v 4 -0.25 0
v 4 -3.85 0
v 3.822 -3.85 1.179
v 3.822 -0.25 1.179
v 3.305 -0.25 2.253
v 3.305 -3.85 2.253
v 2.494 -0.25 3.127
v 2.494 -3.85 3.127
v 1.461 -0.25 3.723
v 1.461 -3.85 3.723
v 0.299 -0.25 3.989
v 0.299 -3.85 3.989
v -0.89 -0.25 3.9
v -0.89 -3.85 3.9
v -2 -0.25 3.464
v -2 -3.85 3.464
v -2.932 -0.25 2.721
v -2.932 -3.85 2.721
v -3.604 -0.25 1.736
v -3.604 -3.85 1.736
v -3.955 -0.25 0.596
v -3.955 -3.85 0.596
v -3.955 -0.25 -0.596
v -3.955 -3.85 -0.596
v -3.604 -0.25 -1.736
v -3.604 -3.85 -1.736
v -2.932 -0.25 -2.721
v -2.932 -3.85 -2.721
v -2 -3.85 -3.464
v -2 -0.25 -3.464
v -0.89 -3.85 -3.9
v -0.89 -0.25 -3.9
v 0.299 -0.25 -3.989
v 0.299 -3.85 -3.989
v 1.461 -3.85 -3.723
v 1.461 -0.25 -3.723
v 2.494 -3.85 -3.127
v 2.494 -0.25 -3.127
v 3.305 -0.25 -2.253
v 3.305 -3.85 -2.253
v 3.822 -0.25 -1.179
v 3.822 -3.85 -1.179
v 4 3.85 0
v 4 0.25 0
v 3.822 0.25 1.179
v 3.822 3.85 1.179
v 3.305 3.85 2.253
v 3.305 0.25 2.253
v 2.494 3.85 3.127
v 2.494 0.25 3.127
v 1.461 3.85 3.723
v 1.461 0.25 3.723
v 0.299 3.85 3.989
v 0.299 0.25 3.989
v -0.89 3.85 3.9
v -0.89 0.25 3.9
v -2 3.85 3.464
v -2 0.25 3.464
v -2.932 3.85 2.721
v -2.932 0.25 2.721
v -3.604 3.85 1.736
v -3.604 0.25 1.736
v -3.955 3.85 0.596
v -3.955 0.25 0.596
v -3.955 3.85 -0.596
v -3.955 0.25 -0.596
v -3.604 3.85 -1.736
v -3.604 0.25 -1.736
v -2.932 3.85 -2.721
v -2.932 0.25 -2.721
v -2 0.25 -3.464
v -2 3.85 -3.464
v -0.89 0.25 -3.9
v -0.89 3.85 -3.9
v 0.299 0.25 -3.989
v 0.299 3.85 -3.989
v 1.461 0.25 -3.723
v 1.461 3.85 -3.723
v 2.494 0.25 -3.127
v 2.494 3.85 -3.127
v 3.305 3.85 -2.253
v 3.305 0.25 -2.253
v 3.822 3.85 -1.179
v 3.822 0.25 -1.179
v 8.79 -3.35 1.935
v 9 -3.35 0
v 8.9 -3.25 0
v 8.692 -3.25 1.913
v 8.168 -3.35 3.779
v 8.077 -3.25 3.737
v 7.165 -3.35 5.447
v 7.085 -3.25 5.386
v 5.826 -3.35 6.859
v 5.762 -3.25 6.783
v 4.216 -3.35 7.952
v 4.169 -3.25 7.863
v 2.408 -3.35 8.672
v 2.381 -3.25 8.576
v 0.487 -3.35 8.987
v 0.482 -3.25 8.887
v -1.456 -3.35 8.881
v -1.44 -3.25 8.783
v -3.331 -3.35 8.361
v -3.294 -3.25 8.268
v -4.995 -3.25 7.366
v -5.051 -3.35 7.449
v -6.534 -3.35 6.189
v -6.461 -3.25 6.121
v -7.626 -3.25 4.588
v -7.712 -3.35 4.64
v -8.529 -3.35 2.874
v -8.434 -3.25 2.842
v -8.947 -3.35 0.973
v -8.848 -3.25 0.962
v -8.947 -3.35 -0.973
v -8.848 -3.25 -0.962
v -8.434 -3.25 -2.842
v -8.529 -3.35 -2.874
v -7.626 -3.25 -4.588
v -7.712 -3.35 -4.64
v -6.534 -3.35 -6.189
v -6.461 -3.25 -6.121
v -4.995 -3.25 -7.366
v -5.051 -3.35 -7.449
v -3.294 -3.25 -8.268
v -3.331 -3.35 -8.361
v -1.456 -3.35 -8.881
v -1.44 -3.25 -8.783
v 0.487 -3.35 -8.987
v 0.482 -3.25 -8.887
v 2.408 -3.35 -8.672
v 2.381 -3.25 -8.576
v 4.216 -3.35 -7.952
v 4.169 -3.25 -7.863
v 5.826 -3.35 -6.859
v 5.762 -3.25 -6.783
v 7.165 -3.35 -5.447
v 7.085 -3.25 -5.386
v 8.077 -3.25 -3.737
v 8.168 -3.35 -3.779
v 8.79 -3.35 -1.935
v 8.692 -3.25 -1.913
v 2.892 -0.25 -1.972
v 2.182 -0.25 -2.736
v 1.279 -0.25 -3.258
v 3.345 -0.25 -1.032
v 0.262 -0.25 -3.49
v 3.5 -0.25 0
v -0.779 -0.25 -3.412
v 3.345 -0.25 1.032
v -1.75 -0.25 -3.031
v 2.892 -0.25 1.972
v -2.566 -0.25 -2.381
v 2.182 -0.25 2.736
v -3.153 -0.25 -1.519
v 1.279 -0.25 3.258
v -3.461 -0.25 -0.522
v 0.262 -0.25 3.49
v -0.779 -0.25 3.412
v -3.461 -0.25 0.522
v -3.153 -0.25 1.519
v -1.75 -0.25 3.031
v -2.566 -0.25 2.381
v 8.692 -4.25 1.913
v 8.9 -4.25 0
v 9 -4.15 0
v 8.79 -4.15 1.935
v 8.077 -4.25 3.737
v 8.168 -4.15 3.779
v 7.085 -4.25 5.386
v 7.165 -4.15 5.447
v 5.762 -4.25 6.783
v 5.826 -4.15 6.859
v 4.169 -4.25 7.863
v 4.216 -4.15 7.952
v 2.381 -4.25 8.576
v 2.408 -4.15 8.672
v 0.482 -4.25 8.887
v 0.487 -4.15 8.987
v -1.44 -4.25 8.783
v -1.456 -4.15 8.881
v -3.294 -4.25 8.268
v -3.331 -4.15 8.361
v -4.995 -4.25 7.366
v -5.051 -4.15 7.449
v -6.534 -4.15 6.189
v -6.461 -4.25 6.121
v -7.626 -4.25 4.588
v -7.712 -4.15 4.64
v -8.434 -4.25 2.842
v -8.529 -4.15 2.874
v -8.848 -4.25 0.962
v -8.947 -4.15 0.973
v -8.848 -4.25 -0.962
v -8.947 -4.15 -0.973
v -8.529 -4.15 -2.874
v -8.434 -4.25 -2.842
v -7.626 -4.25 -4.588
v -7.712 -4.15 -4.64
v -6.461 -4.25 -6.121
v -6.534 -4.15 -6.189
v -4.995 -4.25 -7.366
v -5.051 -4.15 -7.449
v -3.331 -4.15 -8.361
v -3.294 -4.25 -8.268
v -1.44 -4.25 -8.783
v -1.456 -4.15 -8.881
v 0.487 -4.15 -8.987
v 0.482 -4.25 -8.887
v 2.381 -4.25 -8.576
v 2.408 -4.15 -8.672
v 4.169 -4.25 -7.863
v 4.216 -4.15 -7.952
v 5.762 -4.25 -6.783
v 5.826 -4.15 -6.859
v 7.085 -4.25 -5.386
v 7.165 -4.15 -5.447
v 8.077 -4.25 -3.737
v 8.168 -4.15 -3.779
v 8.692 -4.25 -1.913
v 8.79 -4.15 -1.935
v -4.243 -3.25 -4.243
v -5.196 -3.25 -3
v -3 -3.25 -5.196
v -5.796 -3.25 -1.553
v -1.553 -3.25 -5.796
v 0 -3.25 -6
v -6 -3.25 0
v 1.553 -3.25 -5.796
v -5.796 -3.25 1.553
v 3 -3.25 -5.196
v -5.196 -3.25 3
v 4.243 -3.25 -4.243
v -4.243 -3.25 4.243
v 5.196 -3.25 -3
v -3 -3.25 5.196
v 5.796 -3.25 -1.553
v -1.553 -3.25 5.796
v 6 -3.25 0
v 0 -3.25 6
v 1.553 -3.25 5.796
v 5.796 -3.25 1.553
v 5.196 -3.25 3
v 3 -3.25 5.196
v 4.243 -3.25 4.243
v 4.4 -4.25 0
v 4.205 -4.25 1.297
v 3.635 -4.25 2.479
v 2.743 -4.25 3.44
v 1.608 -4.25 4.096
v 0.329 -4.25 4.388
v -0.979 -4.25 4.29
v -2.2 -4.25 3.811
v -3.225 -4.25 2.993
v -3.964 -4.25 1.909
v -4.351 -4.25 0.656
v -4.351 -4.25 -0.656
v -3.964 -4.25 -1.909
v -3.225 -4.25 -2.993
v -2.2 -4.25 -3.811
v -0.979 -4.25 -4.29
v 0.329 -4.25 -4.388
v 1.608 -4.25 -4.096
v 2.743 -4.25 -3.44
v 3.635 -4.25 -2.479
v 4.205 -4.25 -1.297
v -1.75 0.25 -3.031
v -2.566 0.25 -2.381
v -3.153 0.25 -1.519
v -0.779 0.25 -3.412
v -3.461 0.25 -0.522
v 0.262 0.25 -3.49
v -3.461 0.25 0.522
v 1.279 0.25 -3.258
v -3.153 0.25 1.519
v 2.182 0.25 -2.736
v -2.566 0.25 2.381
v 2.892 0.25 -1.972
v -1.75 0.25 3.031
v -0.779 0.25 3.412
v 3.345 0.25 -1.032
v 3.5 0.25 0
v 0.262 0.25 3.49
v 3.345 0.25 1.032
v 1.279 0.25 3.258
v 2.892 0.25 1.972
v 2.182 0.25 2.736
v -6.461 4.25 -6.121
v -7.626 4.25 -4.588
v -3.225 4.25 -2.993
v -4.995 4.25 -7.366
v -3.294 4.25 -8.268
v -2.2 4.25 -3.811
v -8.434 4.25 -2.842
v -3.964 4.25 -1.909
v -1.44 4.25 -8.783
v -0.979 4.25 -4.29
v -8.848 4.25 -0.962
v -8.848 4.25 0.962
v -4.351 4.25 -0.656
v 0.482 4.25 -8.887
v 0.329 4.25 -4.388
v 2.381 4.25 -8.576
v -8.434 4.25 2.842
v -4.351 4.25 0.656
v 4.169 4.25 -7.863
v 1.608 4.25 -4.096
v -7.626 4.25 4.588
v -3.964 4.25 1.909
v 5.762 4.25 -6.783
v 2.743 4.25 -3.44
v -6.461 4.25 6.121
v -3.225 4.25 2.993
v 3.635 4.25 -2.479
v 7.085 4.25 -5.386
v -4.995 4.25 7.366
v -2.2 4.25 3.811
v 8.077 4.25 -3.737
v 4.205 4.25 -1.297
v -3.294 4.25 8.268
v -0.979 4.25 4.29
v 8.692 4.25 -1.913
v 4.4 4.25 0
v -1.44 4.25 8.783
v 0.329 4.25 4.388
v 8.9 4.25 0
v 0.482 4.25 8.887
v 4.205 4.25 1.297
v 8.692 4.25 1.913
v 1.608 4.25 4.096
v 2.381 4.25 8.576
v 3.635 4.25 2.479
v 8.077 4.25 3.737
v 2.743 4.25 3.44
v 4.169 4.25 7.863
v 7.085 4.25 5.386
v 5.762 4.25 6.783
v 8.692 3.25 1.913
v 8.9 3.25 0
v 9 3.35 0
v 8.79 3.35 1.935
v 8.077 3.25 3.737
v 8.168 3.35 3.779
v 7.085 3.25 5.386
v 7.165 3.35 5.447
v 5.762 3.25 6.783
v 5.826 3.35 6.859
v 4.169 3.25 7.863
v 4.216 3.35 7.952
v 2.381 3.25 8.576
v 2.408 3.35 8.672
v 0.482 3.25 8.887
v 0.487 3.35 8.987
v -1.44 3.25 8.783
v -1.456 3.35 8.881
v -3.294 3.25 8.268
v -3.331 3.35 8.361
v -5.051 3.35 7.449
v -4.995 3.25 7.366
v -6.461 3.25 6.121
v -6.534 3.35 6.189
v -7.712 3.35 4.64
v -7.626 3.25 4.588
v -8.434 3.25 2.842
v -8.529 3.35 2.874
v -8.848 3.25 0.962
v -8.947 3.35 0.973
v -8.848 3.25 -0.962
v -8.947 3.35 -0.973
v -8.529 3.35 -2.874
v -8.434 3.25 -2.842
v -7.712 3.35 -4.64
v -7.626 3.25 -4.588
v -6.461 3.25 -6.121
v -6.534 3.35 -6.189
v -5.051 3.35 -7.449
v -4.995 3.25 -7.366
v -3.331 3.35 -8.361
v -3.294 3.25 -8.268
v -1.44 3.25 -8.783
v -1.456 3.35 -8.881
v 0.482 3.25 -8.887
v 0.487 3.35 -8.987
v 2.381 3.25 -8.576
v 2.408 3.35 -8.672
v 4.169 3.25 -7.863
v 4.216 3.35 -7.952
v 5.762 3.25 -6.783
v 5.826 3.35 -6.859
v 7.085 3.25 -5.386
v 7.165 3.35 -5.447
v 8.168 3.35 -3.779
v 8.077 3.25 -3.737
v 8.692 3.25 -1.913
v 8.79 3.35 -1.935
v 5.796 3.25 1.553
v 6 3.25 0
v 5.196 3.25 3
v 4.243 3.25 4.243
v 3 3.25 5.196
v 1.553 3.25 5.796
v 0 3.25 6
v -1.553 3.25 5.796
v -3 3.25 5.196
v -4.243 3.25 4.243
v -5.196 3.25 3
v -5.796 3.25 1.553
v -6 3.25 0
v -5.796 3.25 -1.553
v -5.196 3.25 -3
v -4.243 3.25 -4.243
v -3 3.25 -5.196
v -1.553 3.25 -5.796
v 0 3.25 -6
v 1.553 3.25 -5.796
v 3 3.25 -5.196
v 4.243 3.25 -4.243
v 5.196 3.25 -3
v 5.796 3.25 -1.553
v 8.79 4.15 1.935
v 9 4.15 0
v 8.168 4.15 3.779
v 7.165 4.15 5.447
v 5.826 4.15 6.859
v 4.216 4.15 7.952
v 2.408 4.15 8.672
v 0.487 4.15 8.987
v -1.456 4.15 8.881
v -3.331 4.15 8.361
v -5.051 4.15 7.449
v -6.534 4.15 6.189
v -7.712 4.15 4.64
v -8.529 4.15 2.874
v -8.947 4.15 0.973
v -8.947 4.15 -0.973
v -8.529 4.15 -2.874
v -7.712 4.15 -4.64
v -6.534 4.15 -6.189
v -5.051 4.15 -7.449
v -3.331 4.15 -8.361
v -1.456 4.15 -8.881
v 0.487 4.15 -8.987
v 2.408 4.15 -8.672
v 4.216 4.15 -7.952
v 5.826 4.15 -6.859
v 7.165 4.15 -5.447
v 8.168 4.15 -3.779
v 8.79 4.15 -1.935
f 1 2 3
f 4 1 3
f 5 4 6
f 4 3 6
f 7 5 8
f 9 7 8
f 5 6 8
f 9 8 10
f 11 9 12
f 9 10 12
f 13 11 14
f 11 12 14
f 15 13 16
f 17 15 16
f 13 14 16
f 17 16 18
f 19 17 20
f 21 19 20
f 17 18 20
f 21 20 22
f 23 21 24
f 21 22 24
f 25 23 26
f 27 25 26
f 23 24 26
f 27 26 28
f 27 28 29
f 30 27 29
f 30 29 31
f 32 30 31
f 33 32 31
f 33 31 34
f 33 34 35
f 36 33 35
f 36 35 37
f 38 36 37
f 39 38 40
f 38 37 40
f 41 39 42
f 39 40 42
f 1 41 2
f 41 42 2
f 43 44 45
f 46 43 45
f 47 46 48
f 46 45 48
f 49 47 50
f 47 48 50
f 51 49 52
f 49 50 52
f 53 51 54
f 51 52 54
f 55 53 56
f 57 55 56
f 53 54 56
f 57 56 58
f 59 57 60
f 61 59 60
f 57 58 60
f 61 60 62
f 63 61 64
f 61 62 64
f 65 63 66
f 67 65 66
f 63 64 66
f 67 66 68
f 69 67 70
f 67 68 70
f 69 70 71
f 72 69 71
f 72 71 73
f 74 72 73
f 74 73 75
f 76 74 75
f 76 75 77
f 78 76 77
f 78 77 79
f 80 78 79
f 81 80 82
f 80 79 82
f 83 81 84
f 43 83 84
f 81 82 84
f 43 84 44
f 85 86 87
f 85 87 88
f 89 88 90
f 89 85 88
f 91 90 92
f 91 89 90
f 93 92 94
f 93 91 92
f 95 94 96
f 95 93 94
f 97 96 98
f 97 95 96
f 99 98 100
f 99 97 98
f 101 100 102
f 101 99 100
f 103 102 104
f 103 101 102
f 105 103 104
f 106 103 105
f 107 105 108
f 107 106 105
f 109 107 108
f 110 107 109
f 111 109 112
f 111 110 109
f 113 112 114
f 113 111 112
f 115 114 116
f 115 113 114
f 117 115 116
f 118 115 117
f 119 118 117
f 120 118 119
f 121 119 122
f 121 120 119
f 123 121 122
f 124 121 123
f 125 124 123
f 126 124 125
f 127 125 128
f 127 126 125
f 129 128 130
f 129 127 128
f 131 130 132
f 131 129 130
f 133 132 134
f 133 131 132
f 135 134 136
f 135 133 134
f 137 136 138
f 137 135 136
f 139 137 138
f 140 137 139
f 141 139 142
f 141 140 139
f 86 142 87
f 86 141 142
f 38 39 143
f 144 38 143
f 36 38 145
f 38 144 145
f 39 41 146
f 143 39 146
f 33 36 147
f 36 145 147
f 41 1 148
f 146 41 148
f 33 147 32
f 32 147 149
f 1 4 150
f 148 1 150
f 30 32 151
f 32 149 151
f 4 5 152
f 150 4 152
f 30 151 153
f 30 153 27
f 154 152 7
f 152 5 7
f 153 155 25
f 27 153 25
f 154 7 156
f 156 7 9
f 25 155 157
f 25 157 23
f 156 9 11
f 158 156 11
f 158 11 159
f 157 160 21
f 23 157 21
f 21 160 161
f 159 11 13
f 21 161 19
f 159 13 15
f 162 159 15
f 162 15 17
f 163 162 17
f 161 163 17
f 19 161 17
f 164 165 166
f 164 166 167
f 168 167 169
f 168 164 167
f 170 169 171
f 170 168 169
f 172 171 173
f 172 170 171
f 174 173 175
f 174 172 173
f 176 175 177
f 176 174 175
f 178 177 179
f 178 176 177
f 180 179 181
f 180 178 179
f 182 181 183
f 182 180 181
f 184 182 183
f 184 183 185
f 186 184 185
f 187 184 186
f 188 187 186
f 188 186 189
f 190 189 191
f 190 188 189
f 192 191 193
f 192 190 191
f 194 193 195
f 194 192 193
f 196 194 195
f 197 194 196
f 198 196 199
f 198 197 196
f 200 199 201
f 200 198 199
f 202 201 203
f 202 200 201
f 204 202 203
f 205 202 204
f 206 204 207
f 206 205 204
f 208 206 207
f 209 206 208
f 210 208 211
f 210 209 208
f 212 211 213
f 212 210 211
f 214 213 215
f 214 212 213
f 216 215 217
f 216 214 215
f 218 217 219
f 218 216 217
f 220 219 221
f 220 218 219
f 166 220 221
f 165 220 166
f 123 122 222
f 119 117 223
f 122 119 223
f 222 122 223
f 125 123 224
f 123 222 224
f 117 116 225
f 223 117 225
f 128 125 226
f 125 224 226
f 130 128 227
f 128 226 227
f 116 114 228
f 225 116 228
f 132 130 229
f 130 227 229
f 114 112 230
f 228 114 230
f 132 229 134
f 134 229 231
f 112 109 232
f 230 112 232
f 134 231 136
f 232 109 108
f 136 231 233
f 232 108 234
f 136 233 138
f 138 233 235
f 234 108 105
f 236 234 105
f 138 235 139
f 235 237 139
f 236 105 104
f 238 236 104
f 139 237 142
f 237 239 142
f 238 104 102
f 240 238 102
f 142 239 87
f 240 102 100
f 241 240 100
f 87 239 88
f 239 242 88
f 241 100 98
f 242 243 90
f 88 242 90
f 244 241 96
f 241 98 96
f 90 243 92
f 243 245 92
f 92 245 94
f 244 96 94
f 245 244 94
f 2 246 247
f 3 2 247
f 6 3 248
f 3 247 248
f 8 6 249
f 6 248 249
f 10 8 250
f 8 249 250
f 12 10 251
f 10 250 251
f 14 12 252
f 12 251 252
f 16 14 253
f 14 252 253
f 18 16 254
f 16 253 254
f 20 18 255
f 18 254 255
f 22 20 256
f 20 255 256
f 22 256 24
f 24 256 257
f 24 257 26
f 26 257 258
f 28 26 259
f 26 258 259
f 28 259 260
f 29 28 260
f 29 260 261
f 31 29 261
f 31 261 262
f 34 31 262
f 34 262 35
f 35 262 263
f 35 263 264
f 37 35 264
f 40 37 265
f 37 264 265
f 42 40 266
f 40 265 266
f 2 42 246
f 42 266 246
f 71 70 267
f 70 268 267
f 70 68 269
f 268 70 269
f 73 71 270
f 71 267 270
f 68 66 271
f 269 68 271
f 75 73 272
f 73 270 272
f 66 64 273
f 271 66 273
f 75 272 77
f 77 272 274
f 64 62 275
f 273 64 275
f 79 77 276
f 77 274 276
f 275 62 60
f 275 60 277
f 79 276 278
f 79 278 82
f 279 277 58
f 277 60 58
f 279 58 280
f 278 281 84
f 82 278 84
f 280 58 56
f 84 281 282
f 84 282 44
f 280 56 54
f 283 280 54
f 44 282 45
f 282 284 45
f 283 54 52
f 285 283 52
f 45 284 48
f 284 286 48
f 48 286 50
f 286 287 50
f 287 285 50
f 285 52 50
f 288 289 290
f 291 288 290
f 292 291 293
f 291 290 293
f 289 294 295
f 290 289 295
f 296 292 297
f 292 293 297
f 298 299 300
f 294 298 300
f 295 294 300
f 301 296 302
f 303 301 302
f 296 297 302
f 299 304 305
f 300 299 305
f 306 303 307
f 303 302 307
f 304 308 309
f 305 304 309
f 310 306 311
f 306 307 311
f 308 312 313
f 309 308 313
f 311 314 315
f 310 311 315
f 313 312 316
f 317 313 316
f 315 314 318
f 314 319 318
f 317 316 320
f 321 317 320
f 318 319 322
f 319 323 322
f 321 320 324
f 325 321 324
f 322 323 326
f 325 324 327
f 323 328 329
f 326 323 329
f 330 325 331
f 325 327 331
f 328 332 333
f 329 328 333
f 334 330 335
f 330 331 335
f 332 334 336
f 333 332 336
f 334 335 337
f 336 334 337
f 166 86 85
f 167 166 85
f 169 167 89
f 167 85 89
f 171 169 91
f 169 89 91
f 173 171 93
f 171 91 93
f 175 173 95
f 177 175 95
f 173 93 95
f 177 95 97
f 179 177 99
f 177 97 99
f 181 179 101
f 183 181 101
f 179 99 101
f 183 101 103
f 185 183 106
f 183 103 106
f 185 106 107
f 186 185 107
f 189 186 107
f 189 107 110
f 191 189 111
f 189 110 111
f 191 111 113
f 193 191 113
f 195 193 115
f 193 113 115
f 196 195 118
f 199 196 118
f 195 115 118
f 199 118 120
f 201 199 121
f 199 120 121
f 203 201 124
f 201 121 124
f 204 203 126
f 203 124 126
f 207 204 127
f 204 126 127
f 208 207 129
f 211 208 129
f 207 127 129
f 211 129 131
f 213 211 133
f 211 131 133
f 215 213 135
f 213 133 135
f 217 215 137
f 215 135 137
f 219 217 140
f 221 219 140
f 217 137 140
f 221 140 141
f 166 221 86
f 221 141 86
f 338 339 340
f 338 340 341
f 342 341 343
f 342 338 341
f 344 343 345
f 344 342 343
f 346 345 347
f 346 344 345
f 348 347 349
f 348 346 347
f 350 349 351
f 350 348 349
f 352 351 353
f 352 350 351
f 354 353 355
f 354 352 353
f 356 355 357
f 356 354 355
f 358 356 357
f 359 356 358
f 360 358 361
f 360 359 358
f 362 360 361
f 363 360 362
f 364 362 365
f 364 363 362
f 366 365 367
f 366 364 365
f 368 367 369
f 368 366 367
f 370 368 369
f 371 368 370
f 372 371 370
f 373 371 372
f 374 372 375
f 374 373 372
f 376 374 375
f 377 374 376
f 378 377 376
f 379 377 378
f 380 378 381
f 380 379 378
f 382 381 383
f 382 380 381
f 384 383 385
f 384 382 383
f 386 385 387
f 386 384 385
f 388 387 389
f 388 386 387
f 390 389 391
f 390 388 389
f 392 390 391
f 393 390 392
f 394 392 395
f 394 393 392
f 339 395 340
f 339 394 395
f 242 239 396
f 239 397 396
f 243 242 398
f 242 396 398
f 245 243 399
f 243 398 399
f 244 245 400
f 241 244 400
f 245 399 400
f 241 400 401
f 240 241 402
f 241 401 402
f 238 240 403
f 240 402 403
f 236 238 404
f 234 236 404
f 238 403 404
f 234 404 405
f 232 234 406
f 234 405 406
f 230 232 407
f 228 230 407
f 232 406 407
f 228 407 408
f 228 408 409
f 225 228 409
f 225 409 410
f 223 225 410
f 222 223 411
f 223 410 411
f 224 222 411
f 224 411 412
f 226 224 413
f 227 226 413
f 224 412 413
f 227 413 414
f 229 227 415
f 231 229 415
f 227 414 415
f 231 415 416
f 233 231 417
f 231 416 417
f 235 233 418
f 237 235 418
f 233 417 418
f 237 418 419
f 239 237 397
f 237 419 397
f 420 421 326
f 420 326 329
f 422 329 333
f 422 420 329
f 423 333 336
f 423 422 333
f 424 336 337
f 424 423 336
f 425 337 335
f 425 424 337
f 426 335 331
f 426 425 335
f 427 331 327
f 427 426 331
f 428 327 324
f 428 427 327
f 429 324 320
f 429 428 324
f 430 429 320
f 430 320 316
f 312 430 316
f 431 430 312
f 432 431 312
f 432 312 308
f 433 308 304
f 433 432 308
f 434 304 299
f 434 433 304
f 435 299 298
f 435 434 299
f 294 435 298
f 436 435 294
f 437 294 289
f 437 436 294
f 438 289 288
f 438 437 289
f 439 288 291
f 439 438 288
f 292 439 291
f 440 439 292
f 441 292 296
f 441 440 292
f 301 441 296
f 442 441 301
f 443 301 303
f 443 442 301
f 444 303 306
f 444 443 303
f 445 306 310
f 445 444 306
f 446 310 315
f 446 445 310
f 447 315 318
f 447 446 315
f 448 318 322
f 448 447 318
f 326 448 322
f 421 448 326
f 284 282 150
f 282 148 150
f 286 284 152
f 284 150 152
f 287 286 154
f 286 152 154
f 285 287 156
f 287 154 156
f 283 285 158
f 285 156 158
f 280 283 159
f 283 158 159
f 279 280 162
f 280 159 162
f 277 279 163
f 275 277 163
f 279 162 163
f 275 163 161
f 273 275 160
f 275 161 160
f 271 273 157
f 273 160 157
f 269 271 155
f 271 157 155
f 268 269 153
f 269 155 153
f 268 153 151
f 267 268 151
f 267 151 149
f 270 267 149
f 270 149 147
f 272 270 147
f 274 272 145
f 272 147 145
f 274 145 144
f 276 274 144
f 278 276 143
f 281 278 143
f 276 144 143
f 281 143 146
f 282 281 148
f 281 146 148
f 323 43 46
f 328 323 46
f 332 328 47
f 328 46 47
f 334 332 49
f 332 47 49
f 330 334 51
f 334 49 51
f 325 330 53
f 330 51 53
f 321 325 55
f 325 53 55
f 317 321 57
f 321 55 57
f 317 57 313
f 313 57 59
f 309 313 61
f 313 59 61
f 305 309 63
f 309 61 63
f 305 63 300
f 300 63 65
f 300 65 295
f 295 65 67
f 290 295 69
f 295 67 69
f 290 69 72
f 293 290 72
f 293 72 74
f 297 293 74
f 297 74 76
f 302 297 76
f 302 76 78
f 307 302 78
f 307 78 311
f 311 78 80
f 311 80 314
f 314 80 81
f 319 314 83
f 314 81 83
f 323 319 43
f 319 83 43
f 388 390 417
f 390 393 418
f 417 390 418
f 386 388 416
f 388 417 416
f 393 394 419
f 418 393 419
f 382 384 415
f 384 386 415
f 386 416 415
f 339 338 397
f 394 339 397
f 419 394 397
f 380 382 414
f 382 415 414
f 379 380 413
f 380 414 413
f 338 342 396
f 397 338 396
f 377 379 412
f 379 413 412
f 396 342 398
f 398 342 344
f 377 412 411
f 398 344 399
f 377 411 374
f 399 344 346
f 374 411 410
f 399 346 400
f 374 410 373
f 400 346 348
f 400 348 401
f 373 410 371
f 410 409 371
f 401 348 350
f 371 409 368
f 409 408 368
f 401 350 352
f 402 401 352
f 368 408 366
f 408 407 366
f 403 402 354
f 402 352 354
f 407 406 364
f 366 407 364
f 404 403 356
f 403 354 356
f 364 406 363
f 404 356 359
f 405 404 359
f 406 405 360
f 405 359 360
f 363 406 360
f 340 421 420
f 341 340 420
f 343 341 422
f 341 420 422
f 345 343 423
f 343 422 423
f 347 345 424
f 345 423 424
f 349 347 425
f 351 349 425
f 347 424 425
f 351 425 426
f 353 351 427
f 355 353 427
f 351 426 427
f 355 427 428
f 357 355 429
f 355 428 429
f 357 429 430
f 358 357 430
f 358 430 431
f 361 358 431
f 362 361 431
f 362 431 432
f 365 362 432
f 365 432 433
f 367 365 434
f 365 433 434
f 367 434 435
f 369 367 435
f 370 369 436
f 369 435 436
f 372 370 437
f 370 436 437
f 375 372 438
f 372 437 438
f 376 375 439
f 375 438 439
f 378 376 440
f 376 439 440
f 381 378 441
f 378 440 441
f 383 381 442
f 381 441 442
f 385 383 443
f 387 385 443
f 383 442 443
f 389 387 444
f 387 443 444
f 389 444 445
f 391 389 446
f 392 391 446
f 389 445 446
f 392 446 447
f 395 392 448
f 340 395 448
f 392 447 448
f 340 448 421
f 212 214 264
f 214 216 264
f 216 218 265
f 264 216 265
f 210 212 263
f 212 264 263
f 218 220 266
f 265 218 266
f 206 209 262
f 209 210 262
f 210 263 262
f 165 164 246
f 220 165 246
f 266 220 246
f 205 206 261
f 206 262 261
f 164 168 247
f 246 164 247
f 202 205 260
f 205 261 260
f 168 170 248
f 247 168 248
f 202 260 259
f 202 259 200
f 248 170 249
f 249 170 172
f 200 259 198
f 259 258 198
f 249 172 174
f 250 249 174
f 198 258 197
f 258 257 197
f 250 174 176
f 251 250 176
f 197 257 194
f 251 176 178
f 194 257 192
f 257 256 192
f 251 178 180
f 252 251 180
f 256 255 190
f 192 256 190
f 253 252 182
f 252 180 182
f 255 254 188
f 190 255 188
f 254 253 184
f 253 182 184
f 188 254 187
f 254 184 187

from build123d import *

# Parameters (mm, degrees)
INNERC_SIZE = 0.4
OUTERC_SIZE = 0.1


with BuildPart() as part:
    # BodyS → Body (revolve)
    with BuildSketch(Plane.XY):
        Polygon((6, -3.25), (6, 3.25), (9, 3.25), (9, 4.25), (4, 4.25), (4, 0.25), (3.5, 0.25), (3.5, -0.25), (4, -0.25), (4, -4.25), (9, -4.25), (9, -3.25), align=None)
    revolve(axis=Axis((0, 4.25, 0), (0, -1, 0)))

    # InnerC
    innerc_edges = [part.edges().sort_by_distance(p)[0] for p in [
        (-4, -4.25, 0),
        (-4, 4.25, 0),
    ]]
    chamfer(innerc_edges, length=INNERC_SIZE)

    # OuterC
    outerc_edges = [part.edges().sort_by_distance(p)[0] for p in [
        (-9, 4.25, 0),
        (-9, 3.25, 0),
        (-9, -3.25, 0),
        (-9, -4.25, 0),
    ]]
    chamfer(outerc_edges, length=OUTERC_SIZE)


solid = part.part
